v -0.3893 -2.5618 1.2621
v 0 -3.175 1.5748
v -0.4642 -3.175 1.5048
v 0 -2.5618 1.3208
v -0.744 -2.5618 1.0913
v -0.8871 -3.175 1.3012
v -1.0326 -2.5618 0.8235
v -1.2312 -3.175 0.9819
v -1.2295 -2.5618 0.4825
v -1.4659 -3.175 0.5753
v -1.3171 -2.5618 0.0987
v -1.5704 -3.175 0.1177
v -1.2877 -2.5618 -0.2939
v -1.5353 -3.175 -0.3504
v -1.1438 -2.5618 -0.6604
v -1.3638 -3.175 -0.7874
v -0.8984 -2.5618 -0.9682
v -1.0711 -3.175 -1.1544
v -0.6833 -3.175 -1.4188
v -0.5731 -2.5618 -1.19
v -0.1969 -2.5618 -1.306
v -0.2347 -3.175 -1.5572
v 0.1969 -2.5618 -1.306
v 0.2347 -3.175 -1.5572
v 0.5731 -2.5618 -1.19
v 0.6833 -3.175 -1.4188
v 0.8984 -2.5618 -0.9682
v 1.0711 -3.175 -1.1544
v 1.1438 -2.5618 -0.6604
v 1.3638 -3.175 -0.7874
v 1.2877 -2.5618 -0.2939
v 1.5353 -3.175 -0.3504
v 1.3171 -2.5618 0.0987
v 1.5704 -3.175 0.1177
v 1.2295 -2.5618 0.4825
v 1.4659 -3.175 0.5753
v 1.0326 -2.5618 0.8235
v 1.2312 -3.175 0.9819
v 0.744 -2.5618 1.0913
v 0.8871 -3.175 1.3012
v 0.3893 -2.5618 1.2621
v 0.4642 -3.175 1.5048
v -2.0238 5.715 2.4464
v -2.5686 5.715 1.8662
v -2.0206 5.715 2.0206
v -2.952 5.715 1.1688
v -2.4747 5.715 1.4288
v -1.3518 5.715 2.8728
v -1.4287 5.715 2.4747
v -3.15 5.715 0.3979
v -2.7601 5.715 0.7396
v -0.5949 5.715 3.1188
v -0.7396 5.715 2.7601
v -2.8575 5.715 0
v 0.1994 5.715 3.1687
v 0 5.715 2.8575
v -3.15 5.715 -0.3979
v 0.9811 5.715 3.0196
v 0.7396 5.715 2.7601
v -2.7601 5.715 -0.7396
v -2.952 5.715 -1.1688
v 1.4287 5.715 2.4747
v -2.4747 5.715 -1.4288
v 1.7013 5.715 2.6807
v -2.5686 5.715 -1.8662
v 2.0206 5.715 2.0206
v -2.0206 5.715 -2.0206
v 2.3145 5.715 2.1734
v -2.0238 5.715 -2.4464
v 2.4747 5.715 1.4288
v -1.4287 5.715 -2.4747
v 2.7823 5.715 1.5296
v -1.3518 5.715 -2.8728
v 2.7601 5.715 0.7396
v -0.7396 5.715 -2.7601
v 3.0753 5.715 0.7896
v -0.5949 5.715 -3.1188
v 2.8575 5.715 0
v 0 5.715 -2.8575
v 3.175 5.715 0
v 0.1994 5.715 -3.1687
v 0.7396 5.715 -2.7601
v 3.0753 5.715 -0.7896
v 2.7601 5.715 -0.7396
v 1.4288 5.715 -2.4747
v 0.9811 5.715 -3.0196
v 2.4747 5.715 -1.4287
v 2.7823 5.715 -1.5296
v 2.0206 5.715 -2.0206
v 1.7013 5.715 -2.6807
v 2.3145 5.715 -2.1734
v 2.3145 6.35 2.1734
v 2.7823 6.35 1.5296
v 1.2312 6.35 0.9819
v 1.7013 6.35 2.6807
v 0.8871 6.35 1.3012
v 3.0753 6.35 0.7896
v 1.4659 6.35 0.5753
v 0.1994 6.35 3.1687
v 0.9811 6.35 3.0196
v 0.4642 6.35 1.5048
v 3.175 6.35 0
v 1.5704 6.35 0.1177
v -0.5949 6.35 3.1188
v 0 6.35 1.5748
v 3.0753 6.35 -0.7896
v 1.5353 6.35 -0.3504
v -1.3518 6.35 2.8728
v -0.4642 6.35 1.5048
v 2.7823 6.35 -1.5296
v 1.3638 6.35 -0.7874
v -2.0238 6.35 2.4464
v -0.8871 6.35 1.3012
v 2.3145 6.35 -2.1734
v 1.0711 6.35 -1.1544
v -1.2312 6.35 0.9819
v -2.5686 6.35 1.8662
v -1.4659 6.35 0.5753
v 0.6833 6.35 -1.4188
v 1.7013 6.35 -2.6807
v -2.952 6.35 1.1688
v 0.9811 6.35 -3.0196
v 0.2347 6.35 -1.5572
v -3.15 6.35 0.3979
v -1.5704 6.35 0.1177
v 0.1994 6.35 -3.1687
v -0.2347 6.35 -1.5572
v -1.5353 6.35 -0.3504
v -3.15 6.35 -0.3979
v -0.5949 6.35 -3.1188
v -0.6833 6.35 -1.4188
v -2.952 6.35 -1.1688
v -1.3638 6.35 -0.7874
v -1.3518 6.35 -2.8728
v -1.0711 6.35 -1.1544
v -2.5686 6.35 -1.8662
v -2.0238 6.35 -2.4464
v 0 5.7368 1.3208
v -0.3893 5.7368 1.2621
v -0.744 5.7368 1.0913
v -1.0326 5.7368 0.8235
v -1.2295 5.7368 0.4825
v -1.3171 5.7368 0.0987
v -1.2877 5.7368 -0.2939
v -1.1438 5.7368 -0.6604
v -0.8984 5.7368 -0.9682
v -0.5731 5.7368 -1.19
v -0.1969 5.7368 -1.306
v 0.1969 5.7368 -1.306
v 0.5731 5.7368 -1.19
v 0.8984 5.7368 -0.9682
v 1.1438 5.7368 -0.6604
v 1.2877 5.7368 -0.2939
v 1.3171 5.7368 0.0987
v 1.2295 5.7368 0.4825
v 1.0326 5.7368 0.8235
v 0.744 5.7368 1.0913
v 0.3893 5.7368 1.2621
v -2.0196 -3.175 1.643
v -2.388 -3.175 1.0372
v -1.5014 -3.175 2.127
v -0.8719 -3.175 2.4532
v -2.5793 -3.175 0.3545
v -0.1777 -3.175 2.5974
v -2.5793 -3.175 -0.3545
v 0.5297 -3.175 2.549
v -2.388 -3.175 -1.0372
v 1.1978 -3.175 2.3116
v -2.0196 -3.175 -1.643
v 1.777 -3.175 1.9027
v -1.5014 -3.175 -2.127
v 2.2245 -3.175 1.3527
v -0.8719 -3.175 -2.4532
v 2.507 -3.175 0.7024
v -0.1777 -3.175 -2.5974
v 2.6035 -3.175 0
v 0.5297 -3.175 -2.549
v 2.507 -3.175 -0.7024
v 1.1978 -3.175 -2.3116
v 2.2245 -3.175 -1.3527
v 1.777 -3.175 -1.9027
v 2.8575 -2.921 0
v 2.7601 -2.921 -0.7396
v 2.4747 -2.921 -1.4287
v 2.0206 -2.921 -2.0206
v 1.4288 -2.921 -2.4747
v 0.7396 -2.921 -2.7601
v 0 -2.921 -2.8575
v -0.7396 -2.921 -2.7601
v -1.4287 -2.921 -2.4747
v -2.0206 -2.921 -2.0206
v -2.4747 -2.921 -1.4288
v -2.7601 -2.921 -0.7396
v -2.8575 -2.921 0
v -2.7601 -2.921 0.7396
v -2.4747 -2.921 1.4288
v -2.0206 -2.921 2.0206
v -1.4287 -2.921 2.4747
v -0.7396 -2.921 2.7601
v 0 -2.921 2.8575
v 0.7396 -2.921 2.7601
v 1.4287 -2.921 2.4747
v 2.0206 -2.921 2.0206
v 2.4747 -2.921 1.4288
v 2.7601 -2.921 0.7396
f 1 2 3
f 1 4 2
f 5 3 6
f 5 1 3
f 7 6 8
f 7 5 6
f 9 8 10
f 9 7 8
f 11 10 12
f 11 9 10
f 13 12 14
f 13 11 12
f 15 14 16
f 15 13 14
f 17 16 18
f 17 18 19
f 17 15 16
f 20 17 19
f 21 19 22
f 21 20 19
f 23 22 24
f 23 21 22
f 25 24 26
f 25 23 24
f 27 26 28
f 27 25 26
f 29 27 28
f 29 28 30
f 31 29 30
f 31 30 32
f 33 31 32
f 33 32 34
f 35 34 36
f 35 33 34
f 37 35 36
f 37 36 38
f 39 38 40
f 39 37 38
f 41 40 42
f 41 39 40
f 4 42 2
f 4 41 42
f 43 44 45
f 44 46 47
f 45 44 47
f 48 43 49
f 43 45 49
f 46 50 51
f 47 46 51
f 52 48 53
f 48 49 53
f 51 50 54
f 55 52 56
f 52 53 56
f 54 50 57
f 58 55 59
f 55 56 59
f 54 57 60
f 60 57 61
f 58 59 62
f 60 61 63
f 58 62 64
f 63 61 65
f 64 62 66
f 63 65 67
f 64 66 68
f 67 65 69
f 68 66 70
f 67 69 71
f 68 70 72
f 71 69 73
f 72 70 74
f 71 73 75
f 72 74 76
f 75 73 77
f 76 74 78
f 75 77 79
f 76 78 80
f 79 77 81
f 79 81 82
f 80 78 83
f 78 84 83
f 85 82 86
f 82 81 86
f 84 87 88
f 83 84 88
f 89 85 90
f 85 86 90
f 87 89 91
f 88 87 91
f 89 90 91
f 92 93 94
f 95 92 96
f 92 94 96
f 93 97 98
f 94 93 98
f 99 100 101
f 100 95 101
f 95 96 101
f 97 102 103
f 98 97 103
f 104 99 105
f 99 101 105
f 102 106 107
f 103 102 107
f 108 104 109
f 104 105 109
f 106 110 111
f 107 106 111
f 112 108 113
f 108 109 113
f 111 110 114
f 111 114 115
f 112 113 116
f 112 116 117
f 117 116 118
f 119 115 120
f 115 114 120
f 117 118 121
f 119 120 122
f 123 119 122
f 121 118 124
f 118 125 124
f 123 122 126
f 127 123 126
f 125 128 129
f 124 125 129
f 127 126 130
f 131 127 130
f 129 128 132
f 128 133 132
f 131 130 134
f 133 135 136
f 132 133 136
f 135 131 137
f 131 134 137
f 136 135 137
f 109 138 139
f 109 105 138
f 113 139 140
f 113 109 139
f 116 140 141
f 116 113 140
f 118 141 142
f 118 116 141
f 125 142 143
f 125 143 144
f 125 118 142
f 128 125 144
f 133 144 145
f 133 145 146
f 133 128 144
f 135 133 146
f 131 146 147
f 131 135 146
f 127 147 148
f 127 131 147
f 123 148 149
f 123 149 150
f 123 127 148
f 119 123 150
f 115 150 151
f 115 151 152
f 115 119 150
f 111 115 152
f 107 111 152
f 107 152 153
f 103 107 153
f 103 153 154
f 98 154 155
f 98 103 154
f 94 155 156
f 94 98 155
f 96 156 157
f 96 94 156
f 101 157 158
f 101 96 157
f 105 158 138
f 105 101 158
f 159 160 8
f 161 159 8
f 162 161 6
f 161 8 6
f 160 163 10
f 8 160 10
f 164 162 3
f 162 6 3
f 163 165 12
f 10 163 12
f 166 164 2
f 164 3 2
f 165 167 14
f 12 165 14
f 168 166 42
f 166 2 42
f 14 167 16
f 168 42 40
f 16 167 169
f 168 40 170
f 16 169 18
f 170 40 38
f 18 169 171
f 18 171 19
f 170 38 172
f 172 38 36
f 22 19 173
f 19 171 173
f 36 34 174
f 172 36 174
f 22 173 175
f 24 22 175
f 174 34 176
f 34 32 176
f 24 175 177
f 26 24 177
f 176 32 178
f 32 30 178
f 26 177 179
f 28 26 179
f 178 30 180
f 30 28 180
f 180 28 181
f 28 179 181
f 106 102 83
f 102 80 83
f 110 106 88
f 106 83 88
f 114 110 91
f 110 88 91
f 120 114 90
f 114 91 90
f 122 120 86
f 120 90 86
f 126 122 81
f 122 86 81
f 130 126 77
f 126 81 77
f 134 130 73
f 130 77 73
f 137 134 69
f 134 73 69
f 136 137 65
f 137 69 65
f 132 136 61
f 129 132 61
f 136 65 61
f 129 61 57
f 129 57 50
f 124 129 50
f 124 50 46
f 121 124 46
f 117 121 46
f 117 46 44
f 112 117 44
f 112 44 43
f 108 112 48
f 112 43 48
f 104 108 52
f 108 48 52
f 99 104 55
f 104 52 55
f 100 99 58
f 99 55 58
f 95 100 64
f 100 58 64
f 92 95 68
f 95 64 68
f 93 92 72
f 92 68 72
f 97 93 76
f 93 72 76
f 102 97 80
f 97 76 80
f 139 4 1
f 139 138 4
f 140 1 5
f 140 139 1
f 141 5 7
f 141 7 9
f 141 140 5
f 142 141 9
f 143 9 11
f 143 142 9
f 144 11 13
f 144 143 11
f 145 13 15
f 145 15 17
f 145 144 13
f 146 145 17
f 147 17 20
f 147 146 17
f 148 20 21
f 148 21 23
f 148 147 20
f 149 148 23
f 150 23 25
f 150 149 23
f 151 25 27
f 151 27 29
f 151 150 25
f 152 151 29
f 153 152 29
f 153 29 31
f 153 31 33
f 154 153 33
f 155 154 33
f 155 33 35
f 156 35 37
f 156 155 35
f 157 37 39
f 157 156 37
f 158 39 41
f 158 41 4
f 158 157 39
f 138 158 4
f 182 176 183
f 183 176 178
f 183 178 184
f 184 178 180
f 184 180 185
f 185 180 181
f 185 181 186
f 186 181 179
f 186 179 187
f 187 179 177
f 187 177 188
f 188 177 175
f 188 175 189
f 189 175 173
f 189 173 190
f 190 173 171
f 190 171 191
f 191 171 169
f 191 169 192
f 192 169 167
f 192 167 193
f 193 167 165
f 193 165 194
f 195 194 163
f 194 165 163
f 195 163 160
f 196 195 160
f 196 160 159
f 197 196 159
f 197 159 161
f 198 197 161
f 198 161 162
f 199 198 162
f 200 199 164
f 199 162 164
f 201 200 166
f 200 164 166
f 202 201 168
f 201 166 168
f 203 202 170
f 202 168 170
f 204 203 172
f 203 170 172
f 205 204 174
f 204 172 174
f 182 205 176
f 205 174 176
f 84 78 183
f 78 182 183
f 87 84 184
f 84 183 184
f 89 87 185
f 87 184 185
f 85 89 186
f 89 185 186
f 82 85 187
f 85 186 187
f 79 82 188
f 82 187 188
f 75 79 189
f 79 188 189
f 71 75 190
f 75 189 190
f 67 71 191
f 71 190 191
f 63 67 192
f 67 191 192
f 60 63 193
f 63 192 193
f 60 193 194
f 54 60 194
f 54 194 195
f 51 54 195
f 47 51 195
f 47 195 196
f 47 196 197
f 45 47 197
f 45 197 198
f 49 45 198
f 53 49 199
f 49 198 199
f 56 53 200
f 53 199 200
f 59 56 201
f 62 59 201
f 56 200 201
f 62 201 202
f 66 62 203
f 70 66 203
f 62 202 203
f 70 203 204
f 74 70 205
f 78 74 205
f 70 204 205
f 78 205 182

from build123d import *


with BuildPart() as part:
    # Sketch1 one side → Revolve1 (revolve)
    with BuildSketch(Plane.XY, mode=Mode.PRIVATE) as revolve1_sk:
        Polygon((0, -3.175), (0, 6.35), (-3.175, 6.35), (-3.175, 5.715), (-2.8575, 5.715), (-2.8575, -2.921), (-2.6035, -3.175), align=None)
    revolve(revolve1_sk.sketch.rotate(Axis((0, 0, 0), (0, 1, 0)), 180), axis=Axis((0, 0, 0), (0, 1, 0)))  # turned: the seam where the file's is

    # Sketch2 → #6-80 Tapped Hole1 (revolve, cut)
    with BuildSketch(Plane(origin=(0, 6.35, 0), x_dir=(0, 0, 1), z_dir=(1, 0, 0))):
        Polygon((0, 0), (0, 9.525), (1.5748, 9.525), (1.3208, 8.911789755), (1.3208, 0.613210245), (1.5748, 0), align=None)
    revolve(axis=Axis((0, 12.7, 0), (0, -1, 0)), mode=Mode.SUBTRACT)


solid = part.part
